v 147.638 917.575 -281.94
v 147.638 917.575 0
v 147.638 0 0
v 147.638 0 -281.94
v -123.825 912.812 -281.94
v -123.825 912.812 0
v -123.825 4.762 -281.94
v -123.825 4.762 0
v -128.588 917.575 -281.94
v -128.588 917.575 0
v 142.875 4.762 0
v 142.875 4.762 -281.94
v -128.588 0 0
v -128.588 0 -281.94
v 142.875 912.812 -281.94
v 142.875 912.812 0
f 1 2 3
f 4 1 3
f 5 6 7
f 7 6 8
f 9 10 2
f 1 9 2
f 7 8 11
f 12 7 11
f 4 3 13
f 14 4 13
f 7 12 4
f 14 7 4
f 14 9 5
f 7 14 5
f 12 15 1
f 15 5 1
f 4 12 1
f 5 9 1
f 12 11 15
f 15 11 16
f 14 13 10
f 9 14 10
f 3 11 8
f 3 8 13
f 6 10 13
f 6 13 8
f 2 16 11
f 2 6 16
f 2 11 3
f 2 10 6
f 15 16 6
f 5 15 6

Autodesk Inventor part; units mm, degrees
ref_plane "YZ Plane" through (0, 0, 0) normal (1, 0, 0) x (0, 1, 0)
ref_plane "XZ Plane" through (0, 0, 0) normal (0, 1, 0) x (-1, 0, 0)
ref_plane "XY Plane" through (0, 0, 0) normal (0, 0, 1) x (1, 0, 0)
sketch "Sketch1" plane through (0, 0, 0) normal (0, 0, 1) x (1, 0, 0)
  line L0 (147.6375, 0) -> (-128.5875, 0)
  line L1 (-128.5875, 0) -> (-128.5875, 917.575)
  line L2 (-128.5875, 917.575) -> (147.6375, 917.575)
  line L3 (147.6375, 917.575) -> (147.6375, 0)
  line L4 (142.875, 912.8125) -> (-123.825, 912.8125)
  line L5 (-123.825, 912.8125) -> (-123.825, 4.7625)
  line L6 (-123.825, 4.7625) -> (142.875, 4.7625)
  line L7 (142.875, 4.7625) -> (142.875, 912.8125)
  point P0 (0, 0)
extrude "Extrusion1" add sketch "Sketch1" against normal blind 281.94
properties part number "uv environment" material "PMMA Plastic"
